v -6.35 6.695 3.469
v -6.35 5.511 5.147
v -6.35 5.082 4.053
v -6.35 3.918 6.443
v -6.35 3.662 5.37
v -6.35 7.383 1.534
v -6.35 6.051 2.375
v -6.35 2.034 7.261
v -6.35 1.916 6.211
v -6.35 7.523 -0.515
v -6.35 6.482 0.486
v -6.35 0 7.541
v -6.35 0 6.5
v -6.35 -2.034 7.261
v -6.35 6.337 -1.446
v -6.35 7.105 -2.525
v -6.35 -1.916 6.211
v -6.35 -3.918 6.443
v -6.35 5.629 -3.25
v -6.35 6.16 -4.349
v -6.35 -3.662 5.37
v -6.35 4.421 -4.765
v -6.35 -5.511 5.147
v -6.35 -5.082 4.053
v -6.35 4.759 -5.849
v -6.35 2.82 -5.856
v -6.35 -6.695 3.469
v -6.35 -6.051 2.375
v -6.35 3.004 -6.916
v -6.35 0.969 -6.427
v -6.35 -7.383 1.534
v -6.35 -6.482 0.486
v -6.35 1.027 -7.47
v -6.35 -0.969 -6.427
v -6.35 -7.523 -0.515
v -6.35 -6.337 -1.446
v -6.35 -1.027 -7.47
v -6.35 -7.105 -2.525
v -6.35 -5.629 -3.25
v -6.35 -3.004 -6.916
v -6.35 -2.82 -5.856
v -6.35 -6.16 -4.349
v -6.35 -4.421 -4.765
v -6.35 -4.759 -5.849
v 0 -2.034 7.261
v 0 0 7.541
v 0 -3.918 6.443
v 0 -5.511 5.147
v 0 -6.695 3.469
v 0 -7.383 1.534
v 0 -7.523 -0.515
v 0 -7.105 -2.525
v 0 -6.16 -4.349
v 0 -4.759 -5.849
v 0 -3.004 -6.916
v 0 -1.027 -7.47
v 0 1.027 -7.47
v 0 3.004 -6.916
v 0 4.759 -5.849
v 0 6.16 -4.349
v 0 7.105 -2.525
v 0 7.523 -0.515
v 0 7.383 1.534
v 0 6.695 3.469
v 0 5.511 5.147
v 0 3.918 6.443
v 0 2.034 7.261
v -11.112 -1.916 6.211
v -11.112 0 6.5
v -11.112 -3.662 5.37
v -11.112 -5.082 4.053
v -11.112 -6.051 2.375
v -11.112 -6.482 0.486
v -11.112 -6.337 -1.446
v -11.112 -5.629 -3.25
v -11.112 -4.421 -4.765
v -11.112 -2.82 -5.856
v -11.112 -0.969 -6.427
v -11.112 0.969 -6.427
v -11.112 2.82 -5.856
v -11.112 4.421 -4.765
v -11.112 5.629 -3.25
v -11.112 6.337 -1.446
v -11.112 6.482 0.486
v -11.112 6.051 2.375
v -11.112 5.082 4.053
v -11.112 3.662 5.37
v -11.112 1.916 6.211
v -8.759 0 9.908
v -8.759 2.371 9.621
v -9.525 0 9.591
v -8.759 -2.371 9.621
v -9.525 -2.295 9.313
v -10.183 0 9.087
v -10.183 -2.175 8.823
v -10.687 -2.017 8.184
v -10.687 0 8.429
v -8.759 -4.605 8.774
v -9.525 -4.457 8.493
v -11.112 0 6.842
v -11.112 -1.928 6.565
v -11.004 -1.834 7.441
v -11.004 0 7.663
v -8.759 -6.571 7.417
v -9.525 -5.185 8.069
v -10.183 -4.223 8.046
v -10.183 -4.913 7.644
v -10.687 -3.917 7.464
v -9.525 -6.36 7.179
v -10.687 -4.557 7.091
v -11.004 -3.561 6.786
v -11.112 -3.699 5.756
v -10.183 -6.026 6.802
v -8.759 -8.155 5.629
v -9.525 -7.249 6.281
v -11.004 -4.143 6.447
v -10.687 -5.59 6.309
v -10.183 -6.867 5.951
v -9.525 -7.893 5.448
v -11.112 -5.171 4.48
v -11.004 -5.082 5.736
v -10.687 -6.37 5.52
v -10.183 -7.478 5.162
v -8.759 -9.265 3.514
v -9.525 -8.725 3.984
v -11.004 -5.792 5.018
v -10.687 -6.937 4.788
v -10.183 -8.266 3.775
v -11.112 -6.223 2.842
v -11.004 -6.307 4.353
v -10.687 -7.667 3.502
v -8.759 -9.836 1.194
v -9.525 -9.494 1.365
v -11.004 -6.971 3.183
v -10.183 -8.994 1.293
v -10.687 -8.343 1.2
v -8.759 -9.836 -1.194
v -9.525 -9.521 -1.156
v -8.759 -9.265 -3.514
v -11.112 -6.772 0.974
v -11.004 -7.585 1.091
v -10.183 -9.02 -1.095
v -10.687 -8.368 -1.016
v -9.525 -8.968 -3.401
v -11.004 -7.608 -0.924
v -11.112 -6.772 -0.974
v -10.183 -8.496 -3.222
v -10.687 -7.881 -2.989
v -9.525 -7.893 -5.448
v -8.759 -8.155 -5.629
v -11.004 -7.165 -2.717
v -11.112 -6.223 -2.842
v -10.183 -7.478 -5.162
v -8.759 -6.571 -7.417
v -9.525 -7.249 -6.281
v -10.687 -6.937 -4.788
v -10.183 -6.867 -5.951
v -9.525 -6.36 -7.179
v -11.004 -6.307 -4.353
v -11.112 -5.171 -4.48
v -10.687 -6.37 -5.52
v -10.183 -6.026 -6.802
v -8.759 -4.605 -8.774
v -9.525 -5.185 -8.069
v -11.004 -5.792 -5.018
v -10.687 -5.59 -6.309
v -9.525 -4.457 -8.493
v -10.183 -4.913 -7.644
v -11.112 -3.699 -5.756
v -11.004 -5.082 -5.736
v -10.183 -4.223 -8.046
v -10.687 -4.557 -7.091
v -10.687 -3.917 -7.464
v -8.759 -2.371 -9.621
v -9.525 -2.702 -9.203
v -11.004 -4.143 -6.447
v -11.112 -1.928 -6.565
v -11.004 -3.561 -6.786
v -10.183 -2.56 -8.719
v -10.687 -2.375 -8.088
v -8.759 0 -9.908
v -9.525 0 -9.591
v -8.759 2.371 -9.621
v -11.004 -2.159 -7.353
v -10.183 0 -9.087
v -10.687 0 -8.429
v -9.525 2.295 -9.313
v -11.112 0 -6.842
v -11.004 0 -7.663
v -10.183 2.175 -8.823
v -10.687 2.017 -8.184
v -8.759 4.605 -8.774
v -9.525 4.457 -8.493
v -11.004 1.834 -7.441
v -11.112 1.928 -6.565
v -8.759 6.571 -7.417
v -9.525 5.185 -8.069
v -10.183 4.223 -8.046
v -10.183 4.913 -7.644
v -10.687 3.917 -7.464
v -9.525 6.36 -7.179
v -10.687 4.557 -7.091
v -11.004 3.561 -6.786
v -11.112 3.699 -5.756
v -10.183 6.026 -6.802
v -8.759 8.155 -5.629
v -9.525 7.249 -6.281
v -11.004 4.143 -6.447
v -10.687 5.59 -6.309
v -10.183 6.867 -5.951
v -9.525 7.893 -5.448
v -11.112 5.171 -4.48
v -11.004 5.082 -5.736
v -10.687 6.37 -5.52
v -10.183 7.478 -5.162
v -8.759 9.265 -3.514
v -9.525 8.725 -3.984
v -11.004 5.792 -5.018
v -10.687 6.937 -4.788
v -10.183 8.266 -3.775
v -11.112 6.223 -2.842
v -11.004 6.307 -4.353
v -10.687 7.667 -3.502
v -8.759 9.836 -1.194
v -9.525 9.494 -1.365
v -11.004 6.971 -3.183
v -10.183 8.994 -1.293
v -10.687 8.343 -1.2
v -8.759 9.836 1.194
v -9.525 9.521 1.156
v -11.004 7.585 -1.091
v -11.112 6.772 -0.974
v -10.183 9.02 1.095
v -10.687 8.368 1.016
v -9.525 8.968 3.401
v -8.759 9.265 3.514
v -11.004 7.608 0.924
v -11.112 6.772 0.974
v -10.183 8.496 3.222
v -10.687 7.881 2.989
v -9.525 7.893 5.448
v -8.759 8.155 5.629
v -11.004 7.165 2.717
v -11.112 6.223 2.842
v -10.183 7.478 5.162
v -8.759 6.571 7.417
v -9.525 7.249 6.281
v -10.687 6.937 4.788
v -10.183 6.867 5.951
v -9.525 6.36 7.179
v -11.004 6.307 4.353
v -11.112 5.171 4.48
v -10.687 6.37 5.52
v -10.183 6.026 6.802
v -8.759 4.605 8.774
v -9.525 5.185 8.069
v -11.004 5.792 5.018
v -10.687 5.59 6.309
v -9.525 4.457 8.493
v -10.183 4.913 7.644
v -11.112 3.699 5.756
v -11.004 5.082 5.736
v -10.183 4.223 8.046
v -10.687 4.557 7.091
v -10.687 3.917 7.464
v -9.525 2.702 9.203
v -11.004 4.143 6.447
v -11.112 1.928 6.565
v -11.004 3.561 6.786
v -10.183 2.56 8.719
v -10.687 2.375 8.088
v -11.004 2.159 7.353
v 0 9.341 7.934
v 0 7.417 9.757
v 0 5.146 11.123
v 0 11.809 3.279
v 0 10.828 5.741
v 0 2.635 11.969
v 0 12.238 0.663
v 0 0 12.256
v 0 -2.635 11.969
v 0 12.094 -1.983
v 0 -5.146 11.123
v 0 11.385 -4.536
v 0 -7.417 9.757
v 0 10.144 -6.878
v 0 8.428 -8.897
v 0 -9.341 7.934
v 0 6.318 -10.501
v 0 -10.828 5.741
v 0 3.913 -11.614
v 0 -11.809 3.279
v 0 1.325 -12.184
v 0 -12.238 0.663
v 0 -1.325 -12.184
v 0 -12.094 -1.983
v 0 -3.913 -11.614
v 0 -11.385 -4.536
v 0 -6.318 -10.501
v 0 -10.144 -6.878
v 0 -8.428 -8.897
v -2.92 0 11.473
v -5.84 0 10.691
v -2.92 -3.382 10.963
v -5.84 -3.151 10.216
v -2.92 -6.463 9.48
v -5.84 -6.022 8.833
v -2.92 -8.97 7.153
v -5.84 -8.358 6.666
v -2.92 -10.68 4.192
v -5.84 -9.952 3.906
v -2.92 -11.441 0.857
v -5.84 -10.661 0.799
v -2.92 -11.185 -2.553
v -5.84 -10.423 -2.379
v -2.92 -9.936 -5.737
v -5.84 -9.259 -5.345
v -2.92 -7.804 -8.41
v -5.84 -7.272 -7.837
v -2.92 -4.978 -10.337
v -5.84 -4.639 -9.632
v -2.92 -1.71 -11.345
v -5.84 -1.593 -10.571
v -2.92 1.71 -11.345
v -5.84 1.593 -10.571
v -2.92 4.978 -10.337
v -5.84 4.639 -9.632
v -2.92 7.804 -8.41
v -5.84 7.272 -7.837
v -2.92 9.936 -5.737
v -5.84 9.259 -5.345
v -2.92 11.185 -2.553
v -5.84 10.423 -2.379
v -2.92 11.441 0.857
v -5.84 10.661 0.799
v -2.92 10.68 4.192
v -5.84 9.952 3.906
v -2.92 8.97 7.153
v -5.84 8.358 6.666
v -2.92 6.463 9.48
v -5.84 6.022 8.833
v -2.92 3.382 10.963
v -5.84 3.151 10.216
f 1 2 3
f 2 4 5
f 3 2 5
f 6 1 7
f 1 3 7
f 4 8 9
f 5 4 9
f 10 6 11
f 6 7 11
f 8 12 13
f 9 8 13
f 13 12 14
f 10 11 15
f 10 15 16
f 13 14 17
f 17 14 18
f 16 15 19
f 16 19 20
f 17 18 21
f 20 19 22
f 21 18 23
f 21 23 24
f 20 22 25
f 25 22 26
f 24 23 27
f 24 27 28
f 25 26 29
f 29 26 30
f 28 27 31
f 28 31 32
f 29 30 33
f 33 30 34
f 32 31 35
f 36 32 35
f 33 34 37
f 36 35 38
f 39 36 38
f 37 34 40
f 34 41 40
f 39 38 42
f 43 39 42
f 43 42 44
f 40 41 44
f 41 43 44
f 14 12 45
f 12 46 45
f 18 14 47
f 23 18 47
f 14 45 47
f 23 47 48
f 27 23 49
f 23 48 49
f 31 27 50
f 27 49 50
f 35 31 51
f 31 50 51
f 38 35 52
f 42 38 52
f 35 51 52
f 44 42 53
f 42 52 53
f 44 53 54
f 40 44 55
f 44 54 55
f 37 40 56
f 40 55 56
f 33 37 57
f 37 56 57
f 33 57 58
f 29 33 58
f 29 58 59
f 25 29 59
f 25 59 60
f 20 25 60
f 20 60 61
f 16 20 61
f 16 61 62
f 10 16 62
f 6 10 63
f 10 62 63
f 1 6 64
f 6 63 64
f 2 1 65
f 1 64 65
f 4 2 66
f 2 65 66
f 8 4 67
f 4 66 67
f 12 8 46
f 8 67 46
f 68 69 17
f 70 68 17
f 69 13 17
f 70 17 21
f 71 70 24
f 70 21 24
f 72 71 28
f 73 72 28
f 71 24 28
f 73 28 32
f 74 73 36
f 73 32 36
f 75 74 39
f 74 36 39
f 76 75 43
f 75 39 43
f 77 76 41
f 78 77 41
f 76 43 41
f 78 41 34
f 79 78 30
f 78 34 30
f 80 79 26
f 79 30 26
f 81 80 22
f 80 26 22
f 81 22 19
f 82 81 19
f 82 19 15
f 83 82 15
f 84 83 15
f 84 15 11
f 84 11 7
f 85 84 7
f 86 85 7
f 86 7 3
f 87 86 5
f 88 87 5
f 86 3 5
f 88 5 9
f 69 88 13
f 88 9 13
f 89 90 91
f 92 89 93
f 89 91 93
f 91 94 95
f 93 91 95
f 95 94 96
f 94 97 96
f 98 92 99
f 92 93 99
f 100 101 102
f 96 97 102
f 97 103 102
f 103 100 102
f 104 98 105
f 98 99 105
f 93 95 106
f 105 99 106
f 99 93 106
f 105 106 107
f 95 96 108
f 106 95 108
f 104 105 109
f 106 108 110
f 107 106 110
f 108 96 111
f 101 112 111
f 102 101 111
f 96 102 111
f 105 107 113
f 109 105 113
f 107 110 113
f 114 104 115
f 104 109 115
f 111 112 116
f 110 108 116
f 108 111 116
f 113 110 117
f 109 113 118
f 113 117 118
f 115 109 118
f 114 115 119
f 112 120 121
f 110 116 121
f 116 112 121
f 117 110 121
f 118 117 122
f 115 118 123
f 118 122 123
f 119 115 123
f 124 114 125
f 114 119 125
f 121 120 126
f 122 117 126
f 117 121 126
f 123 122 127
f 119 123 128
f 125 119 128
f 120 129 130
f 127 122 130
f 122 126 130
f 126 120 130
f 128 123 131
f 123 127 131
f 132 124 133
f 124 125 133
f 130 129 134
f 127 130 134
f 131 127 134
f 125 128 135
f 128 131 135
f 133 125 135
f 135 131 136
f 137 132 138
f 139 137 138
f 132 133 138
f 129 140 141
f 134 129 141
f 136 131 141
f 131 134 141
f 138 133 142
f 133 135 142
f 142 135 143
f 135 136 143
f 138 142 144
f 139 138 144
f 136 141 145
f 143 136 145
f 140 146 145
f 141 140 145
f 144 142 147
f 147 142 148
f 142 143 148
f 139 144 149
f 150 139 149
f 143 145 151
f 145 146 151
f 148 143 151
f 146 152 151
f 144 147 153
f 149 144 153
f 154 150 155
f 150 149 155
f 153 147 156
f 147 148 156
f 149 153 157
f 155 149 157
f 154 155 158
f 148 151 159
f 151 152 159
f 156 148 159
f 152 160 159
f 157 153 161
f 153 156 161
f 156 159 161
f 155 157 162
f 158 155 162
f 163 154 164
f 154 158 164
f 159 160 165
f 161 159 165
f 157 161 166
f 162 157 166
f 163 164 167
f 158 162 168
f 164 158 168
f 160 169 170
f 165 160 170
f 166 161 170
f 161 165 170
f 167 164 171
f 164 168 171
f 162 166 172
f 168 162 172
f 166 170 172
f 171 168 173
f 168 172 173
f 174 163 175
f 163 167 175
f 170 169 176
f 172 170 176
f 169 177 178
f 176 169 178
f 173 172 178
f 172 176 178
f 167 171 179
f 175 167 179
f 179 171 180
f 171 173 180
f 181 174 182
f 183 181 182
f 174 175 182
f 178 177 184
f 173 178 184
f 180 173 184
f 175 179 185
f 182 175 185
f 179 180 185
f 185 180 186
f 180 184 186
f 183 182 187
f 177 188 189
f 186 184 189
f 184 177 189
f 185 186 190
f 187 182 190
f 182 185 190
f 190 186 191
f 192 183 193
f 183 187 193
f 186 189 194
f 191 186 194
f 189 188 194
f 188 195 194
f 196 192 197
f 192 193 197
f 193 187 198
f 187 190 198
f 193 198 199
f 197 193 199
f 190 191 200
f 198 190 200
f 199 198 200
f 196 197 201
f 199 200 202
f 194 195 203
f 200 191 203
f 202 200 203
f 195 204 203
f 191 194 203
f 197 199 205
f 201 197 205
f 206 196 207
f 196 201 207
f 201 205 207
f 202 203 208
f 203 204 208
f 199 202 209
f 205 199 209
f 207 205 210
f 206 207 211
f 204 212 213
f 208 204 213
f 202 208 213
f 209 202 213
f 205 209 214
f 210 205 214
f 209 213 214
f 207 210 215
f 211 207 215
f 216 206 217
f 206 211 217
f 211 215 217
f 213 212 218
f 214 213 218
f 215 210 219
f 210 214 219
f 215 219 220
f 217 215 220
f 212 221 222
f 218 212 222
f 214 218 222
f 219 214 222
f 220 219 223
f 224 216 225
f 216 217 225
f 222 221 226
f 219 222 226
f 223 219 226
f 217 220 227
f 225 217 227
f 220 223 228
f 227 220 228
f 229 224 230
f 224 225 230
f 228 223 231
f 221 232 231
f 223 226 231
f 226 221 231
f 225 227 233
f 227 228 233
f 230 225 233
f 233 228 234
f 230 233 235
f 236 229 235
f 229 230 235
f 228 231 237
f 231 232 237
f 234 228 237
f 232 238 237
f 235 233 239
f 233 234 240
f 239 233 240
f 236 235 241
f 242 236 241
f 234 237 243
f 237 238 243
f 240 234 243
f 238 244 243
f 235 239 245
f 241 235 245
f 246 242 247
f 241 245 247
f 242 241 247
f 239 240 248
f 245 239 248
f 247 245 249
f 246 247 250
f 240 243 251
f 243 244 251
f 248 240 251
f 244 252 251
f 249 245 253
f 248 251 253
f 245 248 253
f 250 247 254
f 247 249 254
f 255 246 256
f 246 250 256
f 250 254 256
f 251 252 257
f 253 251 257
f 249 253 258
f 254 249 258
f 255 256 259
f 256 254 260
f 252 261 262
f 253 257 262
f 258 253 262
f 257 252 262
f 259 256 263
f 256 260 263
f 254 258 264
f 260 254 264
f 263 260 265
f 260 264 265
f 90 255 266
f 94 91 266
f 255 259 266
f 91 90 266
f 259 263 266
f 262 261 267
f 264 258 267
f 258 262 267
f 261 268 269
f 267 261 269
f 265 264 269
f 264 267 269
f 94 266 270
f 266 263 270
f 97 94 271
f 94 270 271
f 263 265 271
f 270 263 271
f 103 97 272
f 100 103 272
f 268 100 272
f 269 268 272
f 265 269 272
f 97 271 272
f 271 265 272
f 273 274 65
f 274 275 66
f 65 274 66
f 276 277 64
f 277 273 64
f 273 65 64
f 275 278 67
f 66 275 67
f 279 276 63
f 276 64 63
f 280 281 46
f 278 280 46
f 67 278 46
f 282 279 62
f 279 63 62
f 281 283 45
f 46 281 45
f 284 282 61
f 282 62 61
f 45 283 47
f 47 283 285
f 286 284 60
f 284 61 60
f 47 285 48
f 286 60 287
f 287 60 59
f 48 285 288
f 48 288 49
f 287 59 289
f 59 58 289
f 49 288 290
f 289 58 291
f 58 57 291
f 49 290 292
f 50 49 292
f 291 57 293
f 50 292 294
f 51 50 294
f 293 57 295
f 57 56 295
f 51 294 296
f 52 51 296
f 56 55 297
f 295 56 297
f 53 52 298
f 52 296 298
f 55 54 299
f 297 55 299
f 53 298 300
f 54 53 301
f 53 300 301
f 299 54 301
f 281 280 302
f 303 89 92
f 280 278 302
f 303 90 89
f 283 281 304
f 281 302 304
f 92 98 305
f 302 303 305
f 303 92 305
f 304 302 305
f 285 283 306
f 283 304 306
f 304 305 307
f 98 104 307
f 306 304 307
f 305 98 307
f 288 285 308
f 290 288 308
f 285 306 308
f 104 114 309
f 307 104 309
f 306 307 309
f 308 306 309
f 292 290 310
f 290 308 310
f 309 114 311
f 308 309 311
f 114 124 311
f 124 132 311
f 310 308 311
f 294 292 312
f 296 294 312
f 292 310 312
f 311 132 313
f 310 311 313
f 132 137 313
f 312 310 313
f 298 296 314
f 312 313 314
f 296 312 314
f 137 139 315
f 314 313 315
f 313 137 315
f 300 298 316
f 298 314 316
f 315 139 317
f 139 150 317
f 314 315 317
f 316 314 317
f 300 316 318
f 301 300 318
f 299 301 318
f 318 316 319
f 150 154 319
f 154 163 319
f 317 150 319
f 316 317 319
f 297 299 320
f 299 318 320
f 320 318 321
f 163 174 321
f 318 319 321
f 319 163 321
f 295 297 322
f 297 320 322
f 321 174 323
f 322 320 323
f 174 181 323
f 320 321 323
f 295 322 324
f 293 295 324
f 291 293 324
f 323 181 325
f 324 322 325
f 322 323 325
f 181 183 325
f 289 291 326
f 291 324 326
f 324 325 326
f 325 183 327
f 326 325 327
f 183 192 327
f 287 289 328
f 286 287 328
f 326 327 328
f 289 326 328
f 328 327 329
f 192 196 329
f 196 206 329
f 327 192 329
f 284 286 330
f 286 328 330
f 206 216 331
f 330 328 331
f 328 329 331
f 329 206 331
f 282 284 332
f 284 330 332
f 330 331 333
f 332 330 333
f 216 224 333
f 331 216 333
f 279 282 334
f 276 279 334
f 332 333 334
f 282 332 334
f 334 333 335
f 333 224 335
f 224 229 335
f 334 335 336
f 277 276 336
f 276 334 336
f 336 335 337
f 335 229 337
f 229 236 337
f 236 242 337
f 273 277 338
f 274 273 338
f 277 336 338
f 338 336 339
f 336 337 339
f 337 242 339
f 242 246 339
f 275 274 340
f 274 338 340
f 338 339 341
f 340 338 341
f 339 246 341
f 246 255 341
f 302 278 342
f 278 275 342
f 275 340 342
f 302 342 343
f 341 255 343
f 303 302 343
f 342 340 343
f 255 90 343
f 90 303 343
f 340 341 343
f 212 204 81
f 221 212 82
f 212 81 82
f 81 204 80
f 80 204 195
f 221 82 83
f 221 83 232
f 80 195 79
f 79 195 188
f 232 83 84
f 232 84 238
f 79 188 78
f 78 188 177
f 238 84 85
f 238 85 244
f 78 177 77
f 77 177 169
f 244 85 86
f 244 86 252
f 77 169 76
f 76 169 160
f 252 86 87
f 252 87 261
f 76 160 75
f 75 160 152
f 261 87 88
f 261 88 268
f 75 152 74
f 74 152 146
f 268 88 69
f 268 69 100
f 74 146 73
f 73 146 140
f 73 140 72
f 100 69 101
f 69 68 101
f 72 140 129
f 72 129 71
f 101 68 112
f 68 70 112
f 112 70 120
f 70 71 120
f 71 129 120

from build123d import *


# Not quite as in the source:
# - a feature names something its author has since deleted; it is built from what else it names


with BuildPart() as f1:
    # F0 (on Front) → F1 (revolve)
    with BuildSketch(Plane.XZ):
        with BuildLine():
            Line((0, 7.540625), (0, 12.2555))
            Line((0, 12.2555), (-8.7592504682, 9.9084659107))
            ThreePointArc((-8.7592504682, 9.9084659107), (-10.4563968554, 8.7744689494), (-11.1125, 6.8416514123))
            Line((-11.1125, 6.8416514123), (-11.1125, 6.49986))
            Line((-11.1125, 6.49986), (-6.35, 6.49986))
            Line((-6.35, 6.49986), (-6.35, 7.540625))
            Line((-6.35, 7.540625), (0, 7.540625))
        make_face()
    revolve(axis=Axis((5.2561350167, 0, 0), (1, 0, 0)))


solid = f1.part
